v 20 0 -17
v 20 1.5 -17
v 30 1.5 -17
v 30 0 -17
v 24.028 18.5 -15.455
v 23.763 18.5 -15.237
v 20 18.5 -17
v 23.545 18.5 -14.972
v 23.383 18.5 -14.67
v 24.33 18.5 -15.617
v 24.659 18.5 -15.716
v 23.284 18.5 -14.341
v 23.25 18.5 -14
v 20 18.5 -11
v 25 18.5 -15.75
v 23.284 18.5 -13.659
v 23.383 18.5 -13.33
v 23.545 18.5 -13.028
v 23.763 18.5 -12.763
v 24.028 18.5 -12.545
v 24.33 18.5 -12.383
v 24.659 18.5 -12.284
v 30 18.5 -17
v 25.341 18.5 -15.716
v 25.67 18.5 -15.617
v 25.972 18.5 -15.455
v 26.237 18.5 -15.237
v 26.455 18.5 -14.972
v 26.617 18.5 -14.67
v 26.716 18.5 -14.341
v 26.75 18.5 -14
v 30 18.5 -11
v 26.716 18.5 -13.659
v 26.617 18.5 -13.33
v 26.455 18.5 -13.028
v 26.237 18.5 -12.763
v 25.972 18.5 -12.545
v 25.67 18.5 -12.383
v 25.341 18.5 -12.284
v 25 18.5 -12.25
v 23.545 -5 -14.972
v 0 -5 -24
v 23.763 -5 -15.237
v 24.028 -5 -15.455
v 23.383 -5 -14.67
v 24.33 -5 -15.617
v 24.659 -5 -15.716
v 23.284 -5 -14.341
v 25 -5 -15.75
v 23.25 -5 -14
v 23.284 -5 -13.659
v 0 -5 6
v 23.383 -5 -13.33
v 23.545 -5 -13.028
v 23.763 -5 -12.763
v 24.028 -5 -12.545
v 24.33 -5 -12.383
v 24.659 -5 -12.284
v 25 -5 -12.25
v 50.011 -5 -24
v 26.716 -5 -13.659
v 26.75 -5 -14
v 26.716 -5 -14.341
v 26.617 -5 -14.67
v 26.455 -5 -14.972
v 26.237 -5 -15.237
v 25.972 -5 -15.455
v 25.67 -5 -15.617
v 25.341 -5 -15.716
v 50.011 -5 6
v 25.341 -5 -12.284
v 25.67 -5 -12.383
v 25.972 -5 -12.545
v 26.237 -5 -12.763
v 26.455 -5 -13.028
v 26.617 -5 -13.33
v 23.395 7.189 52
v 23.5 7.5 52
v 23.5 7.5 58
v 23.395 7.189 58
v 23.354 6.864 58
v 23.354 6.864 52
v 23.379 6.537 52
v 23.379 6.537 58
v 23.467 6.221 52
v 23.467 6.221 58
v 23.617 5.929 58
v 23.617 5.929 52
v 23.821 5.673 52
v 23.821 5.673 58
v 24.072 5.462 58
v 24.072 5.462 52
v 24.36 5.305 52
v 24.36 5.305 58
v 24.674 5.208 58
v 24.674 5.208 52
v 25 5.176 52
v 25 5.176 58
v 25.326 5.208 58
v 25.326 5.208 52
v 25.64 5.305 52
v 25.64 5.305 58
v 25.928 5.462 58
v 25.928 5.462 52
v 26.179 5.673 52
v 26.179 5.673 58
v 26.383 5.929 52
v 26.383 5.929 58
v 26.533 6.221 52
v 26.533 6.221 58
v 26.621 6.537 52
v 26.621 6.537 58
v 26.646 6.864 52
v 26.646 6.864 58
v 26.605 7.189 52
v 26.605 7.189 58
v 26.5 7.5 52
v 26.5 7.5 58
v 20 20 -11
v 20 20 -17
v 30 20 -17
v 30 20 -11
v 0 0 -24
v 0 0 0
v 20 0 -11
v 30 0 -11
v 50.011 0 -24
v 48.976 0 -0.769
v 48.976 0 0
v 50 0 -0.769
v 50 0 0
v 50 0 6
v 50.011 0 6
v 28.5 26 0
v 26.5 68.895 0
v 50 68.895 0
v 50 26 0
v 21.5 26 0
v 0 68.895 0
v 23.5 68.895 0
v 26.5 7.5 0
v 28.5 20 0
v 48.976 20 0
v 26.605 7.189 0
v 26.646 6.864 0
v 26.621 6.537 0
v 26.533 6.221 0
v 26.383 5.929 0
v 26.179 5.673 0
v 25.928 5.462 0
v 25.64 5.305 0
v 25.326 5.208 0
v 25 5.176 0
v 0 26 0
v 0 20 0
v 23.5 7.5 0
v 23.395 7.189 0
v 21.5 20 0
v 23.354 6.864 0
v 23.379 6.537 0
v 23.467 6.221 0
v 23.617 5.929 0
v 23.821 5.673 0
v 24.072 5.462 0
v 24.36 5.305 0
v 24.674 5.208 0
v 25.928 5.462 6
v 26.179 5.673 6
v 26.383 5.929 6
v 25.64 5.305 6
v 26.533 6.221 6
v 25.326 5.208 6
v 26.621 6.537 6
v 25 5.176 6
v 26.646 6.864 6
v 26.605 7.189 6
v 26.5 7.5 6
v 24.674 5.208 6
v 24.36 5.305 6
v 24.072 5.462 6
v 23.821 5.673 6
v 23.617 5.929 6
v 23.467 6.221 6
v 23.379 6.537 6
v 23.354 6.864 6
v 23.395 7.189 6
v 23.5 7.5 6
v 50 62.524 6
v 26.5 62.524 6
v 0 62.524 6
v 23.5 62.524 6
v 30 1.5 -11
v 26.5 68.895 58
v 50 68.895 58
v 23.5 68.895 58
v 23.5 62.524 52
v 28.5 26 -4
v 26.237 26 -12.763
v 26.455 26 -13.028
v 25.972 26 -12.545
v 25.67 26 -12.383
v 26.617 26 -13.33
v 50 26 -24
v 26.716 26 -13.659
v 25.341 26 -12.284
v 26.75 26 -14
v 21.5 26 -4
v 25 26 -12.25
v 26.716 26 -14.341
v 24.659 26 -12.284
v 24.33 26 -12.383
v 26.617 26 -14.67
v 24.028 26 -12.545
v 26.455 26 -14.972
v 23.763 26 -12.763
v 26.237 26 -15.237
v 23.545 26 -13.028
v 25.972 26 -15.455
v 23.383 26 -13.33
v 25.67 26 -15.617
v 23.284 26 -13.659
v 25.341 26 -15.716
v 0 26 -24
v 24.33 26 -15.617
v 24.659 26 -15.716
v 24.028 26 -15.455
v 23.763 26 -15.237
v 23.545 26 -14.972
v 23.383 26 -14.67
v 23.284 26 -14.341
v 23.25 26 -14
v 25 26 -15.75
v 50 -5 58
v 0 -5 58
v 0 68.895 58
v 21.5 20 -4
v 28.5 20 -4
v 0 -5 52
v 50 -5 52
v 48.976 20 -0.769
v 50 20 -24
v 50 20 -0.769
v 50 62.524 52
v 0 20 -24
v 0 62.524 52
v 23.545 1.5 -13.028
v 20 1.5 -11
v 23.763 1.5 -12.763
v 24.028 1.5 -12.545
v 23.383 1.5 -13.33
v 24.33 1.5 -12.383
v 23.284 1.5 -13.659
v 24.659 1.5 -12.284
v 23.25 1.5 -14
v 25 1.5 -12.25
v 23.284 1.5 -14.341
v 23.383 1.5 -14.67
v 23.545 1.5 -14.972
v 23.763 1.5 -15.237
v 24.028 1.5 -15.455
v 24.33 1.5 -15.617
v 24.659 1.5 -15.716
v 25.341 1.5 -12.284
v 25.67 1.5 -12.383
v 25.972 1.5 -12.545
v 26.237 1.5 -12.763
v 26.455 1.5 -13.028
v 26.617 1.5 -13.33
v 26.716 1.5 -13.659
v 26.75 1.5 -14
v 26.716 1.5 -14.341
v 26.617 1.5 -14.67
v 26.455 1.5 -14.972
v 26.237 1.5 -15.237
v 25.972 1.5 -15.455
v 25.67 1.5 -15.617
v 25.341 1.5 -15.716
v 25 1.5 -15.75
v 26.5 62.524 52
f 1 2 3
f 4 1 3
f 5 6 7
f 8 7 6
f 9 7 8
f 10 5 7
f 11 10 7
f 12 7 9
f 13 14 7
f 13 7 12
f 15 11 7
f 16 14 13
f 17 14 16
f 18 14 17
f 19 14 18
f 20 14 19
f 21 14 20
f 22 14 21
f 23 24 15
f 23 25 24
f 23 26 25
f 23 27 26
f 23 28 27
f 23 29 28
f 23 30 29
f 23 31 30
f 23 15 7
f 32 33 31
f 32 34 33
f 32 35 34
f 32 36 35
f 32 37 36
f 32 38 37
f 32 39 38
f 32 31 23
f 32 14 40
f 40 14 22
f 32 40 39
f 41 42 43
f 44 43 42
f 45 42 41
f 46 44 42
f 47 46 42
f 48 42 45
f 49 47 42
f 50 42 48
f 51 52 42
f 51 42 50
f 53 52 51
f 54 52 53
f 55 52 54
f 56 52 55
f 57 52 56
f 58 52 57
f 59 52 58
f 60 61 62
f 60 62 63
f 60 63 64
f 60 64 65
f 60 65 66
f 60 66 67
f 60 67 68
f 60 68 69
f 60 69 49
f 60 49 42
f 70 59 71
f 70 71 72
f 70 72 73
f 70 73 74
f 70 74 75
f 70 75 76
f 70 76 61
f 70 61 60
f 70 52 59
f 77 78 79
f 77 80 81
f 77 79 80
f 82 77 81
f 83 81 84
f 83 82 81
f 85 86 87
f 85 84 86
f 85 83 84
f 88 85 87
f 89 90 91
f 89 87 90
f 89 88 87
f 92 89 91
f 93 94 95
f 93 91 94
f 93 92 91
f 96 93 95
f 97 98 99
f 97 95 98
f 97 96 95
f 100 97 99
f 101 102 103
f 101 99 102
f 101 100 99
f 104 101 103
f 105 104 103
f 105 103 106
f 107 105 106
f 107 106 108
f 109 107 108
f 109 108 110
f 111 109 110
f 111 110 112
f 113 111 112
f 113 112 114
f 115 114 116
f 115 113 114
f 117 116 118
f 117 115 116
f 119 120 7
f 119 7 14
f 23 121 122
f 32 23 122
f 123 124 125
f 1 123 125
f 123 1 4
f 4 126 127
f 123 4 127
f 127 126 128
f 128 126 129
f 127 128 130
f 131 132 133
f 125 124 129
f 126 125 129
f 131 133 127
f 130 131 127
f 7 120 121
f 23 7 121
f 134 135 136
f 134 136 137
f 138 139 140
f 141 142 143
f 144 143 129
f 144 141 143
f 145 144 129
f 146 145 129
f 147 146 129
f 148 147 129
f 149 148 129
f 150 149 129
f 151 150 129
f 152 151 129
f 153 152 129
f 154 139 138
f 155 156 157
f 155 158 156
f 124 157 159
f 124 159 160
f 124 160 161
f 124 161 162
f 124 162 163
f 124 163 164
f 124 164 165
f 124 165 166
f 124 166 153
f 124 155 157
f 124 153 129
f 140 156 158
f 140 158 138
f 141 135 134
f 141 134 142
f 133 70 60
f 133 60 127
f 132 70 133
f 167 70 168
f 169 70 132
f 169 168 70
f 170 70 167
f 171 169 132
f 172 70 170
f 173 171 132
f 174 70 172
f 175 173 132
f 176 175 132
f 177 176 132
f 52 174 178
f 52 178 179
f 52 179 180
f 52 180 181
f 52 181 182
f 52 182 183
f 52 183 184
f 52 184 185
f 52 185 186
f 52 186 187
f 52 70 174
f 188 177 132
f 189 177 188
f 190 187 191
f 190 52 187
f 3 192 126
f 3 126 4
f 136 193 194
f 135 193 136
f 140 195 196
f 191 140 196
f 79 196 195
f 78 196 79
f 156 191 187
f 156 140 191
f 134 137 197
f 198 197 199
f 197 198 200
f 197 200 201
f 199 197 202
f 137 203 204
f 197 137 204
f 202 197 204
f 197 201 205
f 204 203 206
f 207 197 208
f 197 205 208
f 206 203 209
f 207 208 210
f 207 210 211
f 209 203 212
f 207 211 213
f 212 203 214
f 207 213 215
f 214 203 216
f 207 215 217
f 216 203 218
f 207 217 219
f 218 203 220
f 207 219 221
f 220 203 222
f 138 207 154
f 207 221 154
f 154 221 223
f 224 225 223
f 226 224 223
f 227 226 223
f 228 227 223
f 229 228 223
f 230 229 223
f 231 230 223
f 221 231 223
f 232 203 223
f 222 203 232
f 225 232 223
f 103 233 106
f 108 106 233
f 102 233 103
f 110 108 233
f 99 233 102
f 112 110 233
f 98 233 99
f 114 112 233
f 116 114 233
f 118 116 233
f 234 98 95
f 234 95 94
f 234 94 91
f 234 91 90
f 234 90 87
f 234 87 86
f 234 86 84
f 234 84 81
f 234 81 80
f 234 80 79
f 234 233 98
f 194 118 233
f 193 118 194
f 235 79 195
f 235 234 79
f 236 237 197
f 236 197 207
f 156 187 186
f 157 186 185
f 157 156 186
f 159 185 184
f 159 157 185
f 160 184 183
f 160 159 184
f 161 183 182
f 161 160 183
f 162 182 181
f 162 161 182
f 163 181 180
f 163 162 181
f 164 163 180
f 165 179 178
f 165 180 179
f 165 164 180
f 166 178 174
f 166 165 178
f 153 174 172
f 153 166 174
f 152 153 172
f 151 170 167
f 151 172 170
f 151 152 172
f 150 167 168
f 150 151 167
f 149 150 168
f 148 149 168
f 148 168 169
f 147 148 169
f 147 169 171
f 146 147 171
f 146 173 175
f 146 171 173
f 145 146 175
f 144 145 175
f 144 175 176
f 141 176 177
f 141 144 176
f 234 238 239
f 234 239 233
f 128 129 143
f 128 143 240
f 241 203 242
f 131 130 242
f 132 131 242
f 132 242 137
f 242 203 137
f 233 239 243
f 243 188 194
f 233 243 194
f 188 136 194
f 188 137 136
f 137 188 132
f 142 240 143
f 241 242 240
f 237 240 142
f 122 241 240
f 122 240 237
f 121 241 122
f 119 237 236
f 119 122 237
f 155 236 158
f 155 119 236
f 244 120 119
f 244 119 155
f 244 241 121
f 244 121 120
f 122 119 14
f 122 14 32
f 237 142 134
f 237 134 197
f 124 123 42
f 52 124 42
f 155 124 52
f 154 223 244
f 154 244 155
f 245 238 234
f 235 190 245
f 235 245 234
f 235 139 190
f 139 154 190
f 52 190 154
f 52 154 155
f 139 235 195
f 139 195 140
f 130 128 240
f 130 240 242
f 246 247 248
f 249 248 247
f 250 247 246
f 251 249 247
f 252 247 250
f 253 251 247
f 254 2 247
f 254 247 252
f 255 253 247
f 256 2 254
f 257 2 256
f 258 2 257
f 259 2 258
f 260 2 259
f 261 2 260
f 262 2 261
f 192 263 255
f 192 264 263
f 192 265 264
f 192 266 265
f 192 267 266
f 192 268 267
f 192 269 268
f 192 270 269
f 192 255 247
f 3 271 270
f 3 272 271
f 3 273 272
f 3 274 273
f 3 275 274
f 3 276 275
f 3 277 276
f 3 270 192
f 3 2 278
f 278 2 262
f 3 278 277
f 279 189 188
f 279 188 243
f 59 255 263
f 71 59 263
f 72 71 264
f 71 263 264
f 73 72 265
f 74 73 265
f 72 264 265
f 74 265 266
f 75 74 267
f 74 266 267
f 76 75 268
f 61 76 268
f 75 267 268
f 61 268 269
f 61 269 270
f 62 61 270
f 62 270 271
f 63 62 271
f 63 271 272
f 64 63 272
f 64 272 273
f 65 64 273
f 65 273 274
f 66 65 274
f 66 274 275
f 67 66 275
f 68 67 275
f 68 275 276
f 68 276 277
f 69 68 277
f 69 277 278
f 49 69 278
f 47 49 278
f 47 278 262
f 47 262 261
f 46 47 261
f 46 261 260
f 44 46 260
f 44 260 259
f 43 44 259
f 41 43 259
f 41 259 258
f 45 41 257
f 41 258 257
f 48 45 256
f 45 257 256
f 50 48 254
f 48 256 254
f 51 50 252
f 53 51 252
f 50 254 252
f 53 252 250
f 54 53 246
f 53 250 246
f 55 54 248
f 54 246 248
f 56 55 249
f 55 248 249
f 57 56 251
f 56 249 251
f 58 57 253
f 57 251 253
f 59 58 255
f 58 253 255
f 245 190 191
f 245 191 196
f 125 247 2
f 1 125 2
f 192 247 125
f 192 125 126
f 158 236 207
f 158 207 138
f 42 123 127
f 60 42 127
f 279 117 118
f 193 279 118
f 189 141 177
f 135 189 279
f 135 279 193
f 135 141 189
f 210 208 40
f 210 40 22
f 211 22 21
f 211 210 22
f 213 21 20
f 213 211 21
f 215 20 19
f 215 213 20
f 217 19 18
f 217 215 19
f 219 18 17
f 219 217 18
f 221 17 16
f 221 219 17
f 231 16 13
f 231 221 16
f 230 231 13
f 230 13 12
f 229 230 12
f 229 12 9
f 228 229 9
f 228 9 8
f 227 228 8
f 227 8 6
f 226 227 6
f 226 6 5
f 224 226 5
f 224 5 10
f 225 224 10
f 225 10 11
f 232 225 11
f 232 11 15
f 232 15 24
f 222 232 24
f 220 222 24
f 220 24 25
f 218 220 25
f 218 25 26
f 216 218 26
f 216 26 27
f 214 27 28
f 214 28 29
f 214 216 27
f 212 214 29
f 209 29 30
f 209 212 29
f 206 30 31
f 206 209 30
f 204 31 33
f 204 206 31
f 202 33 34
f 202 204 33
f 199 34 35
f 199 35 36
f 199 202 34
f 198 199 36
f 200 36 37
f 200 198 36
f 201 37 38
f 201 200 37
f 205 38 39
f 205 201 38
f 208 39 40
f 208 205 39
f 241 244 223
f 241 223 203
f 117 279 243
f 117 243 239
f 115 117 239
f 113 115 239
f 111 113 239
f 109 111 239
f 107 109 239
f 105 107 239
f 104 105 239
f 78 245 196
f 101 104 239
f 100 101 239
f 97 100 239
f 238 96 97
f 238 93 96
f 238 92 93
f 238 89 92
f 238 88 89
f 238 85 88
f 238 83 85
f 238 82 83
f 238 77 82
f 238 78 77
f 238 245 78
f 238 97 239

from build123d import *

# Parameters (mm, degrees)
EXTRUDE_1_DEPTH     = 6
SKETCH_2_W          = 50.01074492
SKETCH_2_H          = 5
EXTRUDE_2_DEPTH     = 30
SKETCH_4_R          = 1.75
CUT_EXTRUDE_1_DEPTH = 30
EXTRUDE_START       = 1.5
SKETCH_6_W          = 10
SKETCH_6_H          = 6
SKETCH_6_R          = 1.75
EXTRUDE_4_DEPTH     = 1.5
EXTRUDE_6_DEPTH     = 50
CUT_EXTRUDE_2_REACH = 105.013
SKETCH_15_W         = 1.024057277
SKETCH_15_H         = 0.768849672
EXTRUDE_10_DEPTH    = 20
EXTRUDE_11_DEPTH    = 6
SKETCH_17_W         = 10
SKETCH_17_H         = 6
SKETCH_17_R         = 1.75
EXTRUDE_12_DEPTH    = 1.5
CUT_EXTRUDE_START   = -100
SKETCH_18_R         = 1.75
CUT_EXTRUDE_3_DEPTH = 100


with BuildPart() as part:
    # Эскиз1 → Бобышка-Вытянуть1 (new body)
    with BuildSketch(Plane.XY):
        Polygon((0, 0), (8.5, 0), (11.5, 0), (38.5, 0), (41.5, 0), (50, 0), (50, 10), (50, 30), (30, 30), (20, 30), (0, 30), (0, 10), align=None)
        with BuildLine():
            Line((28, 22.5), (28, 7.5))
            ThreePointArc((28, 7.5), (25, 4.5), (22, 7.5))
            Line((22, 7.5), (22, 22.5))
            ThreePointArc((22, 22.5), (25, 25.5), (28, 22.5))
        make_face(mode=Mode.SUBTRACT)
    extrude(amount=EXTRUDE_1_DEPTH)

    # Эскиз2 → Бобышка-Вытянуть2 (add)
    with BuildSketch(Plane.XY.offset(6)):
        with Locations((25.00537246, -2.5)):
            Rectangle(SKETCH_2_W, SKETCH_2_H)
    extrude(amount=-EXTRUDE_2_DEPTH)

    # Эскиз4 → Вырез-Вытянуть1 (cut)
    with BuildSketch(Plane(origin=(0, 0, 0), x_dir=(1, 0, 0), z_dir=(0, 1, 0))):
        with Locations(Location((25, 14, 0), (0, 0, 270))):
            Circle(SKETCH_4_R)
    extrude(amount=-CUT_EXTRUDE_1_DEPTH, mode=Mode.SUBTRACT)

    # Эскиз6 → Бобышка-Вытянуть4 (add)
    with BuildSketch(Plane(origin=(0, 0, 0), x_dir=(1, 0, 0), z_dir=(0, 1, 0)).offset(EXTRUDE_START)):
        with Locations((25, 14)):
            Rectangle(SKETCH_6_W, SKETCH_6_H)
        with Locations(Location((25, 14, 0), (0, 0, 270))):
            Circle(SKETCH_6_R, mode=Mode.SUBTRACT)
    extrude(amount=-EXTRUDE_4_DEPTH)

    # Эскиз7 → Бобышка-Вытянуть6 (add)
    with BuildSketch(Plane.ZY):
        Polygon((58, -5), (58, 68.895321777), (0, 68.895321777), (0, 62.524087888), (0, -5), (6, -5), (6, 62.524087888), (52, 62.524087888), (52, -5), align=None)
    extrude(amount=-EXTRUDE_6_DEPTH)

    # Вырез-Вытянуть2: up to this face of the body (flat: up to its plane)
    cut_extrude_2_end = Plane(part.part.faces().sort_by_distance((25, 31.947660889, 58))[0])
    # Эскиз8 → Вырез-Вытянуть2 (cut, up to the picked face)
    with BuildSketch(Plane(origin=(0, 0, 0), x_dir=(-1, 0, 0), z_dir=(0, 0, -1)), mode=Mode.PRIVATE) as cut_extrude_2_sk1:
        with BuildLine():
            Line((-26.5, 112.5), (-23.5, 112.5))
            Line((-23.5, 112.5), (-23.5, 7.5))
            ThreePointArc((-23.5, 7.5), (-25, 5.175598625), (-26.5, 7.5))
            Line((-26.5, 7.5), (-26.5, 112.5))
        make_face()
    cut_extrude_2_tool1 = split(extrude(cut_extrude_2_sk1.sketch, amount=-CUT_EXTRUDE_2_REACH, mode=Mode.PRIVATE), bisect_by=cut_extrude_2_end, keep=Keep.BOTH, mode=Mode.PRIVATE)
    add(cut_extrude_2_tool1.solids().sort_by(Axis((25, 58.930041, 0), (0, 0, 1)))[0], mode=Mode.SUBTRACT)

    # Эскиз15 → Бобышка-Вытянуть10 (add)
    with BuildSketch(Plane(origin=(0, 0, 0), x_dir=(1, 0, 0), z_dir=(0, 1, 0))):
        with Locations((49.487971362, 0.384424836)):
            Rectangle(SKETCH_15_W, SKETCH_15_H)
    extrude(amount=EXTRUDE_10_DEPTH)

    # Эскиз16 → Бобышка-Вытянуть11 (add)
    with BuildSketch(Plane(origin=(0, 20, 0), x_dir=(1, 0, 0), z_dir=(0, 1, 0))):
        Polygon((50, 0), (28.5, 0), (28.5, 4), (21.5, 4), (21.5, 0), (0, 0), (0, 24), (50, 24), align=None)
    extrude(amount=EXTRUDE_11_DEPTH)

    # Эскиз17 → Бобышка-Вытянуть12 (add)
    with BuildSketch(Plane.XZ.offset(-20)):
        with Locations((25, -14)):
            Rectangle(SKETCH_17_W, SKETCH_17_H)
        with Locations(Location((25, -14, 0), (0, 0, 90))):
            Circle(SKETCH_17_R, mode=Mode.SUBTRACT)
    extrude(amount=EXTRUDE_12_DEPTH)

    # Эскиз18 → Вырез-Вытянуть3 (cut)
    with BuildSketch(Plane.XZ.offset(-18.5).offset(CUT_EXTRUDE_START)):
        with Locations(Location((25, -14, 0), (0, 0, 90))):
            Circle(SKETCH_18_R)
    extrude(amount=CUT_EXTRUDE_3_DEPTH, mode=Mode.SUBTRACT)


solid = part.part
